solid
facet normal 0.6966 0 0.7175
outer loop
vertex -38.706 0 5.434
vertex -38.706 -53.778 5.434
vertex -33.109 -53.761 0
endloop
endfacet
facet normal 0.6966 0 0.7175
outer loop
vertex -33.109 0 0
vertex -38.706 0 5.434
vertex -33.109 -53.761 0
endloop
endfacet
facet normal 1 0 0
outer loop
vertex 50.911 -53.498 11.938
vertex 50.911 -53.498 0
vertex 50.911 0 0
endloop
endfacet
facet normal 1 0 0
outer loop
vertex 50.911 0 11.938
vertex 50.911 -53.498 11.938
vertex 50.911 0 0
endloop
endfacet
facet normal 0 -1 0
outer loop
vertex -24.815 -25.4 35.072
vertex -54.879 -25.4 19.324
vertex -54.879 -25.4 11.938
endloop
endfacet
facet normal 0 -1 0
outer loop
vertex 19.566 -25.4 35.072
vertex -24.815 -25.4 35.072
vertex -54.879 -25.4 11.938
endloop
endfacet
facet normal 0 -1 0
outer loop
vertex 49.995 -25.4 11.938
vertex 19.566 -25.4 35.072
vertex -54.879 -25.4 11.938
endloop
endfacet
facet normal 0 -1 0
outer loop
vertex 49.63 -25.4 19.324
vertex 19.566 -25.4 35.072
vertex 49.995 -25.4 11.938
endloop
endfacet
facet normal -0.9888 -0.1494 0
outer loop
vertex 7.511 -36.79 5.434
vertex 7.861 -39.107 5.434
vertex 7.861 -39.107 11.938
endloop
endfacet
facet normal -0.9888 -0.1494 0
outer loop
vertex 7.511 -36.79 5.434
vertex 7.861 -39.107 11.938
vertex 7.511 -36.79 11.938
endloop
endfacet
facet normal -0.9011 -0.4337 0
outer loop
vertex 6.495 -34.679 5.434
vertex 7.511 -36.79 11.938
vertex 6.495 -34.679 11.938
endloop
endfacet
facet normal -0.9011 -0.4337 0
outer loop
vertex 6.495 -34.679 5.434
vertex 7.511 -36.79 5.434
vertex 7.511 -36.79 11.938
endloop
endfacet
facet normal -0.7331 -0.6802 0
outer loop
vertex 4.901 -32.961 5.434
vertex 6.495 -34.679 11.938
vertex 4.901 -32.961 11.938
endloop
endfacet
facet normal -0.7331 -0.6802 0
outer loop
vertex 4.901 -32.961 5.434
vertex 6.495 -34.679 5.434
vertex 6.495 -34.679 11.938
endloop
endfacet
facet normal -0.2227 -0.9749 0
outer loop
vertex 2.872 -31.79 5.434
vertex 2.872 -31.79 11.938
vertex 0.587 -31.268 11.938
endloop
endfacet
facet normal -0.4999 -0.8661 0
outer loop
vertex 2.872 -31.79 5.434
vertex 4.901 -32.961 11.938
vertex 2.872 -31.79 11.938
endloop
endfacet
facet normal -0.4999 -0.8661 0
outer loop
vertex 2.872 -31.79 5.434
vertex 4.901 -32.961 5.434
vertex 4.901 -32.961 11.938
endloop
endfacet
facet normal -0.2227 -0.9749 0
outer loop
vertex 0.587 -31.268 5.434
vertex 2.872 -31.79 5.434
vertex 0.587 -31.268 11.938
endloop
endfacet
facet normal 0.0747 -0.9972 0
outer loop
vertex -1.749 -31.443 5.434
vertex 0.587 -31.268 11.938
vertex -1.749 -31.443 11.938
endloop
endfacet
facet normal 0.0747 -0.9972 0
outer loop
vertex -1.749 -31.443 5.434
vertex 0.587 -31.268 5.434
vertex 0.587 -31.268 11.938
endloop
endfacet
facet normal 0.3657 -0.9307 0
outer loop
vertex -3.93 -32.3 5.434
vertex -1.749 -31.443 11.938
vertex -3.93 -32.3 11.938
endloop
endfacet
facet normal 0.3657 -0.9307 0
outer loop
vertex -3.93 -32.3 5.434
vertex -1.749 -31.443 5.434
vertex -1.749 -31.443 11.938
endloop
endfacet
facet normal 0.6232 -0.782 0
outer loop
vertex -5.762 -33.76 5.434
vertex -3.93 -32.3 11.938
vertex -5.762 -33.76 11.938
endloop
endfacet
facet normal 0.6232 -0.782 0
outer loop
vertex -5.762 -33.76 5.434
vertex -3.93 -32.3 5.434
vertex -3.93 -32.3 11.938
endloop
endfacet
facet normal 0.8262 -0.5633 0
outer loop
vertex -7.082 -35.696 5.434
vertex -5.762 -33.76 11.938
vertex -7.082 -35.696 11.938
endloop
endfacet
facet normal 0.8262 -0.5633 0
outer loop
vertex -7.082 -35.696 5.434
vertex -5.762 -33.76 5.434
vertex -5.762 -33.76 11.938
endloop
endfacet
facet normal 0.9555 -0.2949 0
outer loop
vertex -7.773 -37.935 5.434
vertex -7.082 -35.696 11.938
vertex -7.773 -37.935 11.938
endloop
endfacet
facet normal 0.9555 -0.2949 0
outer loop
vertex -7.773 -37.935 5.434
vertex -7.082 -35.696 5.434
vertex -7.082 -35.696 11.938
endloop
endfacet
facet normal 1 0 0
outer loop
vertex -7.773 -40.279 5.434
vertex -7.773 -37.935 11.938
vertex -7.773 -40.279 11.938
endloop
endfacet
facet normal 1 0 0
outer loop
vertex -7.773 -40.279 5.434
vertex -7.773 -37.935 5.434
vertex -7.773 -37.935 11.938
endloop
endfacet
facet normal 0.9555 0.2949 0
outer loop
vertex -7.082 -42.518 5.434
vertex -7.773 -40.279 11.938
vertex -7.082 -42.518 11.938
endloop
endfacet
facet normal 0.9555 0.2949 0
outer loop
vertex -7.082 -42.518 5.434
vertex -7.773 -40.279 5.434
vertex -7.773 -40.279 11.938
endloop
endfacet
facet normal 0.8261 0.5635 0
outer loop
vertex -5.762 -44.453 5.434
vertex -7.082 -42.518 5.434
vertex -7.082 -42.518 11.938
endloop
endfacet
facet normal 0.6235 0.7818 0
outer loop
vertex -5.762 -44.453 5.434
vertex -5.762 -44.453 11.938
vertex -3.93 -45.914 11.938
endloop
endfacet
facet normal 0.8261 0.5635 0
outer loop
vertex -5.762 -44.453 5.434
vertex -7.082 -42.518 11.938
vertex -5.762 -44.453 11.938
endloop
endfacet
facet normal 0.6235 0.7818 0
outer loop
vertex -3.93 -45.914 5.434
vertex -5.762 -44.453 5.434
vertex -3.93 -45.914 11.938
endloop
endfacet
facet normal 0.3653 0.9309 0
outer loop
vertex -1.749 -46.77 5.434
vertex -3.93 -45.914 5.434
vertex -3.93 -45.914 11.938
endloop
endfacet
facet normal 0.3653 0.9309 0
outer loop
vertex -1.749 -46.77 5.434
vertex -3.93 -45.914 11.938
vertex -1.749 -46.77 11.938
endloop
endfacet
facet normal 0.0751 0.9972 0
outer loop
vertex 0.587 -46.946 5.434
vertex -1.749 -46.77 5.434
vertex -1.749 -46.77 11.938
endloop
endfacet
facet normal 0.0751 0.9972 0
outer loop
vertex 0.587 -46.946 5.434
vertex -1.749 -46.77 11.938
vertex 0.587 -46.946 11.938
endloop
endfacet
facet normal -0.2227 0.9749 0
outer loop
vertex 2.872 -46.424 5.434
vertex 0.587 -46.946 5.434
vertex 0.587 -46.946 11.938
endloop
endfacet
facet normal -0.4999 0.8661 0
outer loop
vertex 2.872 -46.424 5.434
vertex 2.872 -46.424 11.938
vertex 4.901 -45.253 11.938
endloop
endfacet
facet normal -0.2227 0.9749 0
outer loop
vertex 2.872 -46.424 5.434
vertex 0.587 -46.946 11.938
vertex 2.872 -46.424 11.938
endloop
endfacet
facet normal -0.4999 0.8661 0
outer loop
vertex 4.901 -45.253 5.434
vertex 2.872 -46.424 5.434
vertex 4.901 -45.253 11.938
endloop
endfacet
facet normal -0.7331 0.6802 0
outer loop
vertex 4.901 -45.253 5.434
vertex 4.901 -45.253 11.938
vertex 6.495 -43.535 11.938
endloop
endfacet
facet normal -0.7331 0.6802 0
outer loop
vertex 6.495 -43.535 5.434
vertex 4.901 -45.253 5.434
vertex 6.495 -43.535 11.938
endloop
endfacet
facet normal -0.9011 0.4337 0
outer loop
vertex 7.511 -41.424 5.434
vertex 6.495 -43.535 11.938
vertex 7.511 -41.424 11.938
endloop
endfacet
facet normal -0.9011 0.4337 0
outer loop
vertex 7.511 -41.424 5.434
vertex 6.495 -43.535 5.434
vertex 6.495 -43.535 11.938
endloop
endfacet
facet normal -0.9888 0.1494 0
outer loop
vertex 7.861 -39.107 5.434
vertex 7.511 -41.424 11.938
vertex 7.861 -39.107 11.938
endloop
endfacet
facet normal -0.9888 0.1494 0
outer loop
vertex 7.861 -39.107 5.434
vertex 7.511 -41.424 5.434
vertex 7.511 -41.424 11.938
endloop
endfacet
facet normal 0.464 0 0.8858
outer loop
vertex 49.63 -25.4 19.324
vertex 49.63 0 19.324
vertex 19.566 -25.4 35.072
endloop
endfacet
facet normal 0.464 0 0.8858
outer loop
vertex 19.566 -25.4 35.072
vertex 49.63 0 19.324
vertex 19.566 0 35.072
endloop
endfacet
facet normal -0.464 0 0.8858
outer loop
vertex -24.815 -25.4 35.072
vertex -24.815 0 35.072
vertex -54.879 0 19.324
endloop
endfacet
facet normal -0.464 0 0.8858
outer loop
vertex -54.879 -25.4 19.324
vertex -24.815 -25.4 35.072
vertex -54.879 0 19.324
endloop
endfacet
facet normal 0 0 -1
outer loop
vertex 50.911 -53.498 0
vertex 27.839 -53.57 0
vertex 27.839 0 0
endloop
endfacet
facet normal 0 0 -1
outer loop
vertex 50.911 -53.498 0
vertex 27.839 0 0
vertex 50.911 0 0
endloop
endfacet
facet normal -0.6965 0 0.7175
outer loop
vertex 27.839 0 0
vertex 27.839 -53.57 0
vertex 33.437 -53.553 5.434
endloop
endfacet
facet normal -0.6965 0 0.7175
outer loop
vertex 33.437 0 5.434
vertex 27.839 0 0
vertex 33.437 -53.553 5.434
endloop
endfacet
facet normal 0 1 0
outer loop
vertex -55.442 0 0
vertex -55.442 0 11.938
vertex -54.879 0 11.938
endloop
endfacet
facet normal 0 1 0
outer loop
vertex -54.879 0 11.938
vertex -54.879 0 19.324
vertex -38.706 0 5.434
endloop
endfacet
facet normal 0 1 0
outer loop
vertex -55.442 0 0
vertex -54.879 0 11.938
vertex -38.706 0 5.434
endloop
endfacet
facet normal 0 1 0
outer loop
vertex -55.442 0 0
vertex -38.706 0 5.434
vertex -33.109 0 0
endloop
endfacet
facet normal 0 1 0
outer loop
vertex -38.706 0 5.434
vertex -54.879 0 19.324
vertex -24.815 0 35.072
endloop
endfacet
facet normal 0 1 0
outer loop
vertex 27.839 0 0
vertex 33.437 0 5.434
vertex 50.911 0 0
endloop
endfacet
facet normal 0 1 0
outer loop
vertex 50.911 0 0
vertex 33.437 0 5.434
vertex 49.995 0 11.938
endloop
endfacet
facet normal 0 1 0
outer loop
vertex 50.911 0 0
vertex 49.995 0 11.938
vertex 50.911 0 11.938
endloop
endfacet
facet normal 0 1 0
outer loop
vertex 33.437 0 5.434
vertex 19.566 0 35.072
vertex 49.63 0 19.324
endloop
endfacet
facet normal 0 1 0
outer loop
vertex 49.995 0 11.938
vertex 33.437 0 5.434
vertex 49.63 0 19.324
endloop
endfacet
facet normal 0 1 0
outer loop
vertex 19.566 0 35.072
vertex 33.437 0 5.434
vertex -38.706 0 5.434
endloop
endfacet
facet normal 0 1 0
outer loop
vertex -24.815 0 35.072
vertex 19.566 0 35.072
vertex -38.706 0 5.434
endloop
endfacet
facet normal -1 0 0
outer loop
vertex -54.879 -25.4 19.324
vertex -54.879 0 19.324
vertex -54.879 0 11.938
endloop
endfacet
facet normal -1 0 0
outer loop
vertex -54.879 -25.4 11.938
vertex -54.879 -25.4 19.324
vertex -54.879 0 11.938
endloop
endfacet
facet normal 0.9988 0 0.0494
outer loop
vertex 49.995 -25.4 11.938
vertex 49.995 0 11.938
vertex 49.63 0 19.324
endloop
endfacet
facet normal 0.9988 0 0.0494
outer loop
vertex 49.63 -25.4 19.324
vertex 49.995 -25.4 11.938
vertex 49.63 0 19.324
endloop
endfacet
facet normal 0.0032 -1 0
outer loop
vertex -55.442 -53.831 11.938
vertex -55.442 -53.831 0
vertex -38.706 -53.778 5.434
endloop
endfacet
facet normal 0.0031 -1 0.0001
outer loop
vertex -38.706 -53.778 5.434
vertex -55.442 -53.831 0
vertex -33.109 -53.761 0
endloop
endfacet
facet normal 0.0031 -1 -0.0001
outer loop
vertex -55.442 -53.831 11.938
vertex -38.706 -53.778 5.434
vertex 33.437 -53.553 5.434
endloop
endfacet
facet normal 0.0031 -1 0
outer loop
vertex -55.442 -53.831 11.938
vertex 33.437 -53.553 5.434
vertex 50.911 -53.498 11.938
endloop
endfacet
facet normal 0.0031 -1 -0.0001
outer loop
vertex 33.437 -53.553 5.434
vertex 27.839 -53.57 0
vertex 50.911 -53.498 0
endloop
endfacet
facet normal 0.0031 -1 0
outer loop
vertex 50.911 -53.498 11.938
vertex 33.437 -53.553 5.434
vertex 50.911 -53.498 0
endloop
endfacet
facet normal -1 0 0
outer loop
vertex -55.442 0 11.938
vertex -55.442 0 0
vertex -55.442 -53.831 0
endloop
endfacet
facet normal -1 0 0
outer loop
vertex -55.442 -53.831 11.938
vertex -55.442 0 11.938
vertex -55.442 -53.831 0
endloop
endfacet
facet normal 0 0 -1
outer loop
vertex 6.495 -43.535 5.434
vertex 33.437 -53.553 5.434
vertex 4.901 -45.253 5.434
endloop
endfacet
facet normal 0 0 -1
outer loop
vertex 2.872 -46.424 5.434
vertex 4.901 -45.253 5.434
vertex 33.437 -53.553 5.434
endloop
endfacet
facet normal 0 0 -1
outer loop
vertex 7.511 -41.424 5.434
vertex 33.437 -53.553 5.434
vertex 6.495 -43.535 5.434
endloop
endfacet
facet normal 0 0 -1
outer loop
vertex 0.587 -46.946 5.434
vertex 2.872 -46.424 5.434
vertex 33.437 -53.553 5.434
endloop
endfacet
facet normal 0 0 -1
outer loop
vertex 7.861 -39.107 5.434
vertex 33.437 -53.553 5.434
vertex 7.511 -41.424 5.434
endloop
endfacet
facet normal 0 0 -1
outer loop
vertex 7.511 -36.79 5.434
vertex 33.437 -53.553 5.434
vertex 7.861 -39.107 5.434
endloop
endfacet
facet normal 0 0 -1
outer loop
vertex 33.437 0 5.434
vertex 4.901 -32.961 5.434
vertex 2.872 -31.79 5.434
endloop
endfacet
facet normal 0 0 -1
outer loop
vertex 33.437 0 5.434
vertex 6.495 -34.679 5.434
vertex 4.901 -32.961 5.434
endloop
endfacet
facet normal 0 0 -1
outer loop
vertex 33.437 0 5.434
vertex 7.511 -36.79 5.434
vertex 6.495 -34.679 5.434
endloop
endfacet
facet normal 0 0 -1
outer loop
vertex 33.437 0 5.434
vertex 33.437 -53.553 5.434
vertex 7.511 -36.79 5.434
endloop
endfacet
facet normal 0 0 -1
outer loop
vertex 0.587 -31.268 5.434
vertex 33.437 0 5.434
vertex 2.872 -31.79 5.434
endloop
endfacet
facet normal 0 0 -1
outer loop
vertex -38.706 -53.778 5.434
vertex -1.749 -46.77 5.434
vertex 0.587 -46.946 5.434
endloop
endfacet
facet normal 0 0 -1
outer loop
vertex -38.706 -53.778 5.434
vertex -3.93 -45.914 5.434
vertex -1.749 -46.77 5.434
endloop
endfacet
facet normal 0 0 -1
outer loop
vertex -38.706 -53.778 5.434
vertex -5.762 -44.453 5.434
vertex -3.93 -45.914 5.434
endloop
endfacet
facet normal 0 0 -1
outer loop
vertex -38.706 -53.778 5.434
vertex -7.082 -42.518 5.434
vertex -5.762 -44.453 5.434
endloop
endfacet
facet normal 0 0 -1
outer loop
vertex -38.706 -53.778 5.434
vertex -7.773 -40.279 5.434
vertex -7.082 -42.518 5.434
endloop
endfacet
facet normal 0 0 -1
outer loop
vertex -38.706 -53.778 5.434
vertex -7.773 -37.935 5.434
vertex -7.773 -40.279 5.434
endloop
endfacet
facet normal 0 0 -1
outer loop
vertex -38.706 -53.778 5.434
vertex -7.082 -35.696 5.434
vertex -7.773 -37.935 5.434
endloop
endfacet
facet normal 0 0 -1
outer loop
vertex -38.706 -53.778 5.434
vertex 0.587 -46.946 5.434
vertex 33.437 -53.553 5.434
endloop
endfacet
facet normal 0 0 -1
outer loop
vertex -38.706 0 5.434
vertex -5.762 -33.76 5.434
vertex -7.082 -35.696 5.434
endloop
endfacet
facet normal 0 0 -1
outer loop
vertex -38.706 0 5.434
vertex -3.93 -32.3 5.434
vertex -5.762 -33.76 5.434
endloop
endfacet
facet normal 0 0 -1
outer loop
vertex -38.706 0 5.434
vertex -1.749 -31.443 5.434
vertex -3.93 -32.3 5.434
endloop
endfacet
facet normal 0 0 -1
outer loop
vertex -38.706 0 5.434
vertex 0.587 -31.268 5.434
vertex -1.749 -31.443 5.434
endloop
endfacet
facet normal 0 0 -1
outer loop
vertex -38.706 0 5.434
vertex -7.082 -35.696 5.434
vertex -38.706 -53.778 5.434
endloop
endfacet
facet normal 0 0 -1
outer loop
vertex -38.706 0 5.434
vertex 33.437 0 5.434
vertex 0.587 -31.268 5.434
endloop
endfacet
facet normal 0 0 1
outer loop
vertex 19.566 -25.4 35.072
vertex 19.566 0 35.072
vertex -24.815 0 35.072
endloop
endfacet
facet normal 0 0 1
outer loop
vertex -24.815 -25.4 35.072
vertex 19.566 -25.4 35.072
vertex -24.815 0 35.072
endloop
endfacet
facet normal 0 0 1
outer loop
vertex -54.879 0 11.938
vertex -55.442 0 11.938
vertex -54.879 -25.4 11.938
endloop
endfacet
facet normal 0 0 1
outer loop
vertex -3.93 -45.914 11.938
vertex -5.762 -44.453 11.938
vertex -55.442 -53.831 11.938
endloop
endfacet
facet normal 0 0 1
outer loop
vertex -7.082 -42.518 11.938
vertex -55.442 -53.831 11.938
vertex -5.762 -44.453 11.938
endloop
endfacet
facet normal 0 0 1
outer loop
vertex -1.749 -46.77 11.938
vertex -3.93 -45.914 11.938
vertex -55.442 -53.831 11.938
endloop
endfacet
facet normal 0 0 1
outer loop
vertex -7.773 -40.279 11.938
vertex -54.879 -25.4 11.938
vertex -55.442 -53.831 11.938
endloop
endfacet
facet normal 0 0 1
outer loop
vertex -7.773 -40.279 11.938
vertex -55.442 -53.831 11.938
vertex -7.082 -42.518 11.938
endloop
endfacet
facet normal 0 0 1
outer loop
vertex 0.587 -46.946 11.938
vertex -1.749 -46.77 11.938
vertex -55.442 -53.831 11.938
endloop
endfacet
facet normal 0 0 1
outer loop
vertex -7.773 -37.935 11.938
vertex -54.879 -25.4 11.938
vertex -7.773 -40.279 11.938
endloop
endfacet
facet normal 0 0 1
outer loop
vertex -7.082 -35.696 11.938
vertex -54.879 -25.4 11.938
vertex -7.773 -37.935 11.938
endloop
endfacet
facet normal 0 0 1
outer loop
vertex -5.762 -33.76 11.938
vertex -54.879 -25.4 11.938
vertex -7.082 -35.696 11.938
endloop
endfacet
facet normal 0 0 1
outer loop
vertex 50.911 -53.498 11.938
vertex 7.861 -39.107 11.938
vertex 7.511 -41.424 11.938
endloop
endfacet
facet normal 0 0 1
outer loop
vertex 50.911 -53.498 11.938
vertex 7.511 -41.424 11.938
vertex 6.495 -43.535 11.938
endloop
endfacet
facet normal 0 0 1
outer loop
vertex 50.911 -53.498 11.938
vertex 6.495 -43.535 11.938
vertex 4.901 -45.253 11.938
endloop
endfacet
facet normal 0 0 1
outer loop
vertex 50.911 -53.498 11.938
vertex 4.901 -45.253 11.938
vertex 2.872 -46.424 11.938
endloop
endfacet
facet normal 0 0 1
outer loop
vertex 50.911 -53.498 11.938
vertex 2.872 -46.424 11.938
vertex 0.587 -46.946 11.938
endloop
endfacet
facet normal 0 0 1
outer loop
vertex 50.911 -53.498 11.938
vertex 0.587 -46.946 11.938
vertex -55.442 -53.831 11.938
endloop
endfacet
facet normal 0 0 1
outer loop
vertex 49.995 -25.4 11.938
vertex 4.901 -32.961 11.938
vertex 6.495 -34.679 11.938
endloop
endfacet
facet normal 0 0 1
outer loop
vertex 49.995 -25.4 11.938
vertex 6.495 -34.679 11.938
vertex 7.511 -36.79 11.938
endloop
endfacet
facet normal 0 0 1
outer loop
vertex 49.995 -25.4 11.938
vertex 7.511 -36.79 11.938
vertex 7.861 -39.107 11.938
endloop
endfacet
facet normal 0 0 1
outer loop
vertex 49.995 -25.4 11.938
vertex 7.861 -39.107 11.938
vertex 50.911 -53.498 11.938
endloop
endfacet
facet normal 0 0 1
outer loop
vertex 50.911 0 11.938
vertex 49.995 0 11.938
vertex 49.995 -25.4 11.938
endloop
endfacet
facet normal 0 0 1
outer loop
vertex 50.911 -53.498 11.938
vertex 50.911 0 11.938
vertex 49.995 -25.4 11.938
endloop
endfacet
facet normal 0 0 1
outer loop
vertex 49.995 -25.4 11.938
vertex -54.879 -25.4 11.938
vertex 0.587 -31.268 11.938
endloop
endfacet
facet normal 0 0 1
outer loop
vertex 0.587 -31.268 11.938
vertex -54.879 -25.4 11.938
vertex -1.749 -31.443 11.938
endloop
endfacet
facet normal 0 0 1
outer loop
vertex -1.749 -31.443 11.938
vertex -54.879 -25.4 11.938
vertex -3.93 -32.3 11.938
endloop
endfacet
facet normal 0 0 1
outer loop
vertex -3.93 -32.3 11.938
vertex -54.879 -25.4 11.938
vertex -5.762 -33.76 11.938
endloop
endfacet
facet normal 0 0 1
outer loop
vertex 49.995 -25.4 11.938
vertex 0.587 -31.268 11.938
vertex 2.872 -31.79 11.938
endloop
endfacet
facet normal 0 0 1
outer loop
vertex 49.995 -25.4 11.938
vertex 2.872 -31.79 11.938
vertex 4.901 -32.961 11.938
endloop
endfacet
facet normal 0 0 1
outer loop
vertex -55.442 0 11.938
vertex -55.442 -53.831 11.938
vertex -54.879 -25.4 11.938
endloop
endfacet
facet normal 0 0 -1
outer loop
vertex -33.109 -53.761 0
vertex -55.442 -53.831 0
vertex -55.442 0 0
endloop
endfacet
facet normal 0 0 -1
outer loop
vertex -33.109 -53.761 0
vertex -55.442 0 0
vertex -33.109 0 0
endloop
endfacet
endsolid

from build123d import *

# Parameters (mm, degrees)
F2_DEPTH = 11.938
F3_DEPTH = 25.4
F5_DEPTH = 72.644
F6_R     = 7.860553
F7_DEPTH = 35.306


with BuildPart() as f2:
    # F1 (on Top) → F2 (new body)
    with BuildSketch(Plane.XY):
        Polygon((50.910734, 0), (-55.442028, 0), (-55.442028, -53.830672), (50.910734, -53.498318), align=None)
    extrude(amount=F2_DEPTH)

    # F0 (on Front) → F3 (join)
    with BuildSketch(Plane.XZ):
        Polygon((-54.879387, 19.324376), (-54.879387, 0), (50.584481, 0), (49.630058, 19.324376), (19.565694, 35.072376), (-24.815029, 35.072376), align=None)
    extrude(amount=F3_DEPTH)

    # F4 (on Front) → F5 (cut)
    with BuildSketch(Plane.XZ):
        Polygon((33.436544, 5.434085), (-38.706463, 5.434085), (-33.109158, 0), (27.839245, 0), align=None)
    extrude(amount=F5_DEPTH, mode=Mode.SUBTRACT)

    # F6 (on Top) → F7 (cut)
    with BuildSketch(Plane.XY):
        with Locations((0, -39.10695)):
            Circle(F6_R)
    extrude(amount=F7_DEPTH, mode=Mode.SUBTRACT)


solid = f2.part
